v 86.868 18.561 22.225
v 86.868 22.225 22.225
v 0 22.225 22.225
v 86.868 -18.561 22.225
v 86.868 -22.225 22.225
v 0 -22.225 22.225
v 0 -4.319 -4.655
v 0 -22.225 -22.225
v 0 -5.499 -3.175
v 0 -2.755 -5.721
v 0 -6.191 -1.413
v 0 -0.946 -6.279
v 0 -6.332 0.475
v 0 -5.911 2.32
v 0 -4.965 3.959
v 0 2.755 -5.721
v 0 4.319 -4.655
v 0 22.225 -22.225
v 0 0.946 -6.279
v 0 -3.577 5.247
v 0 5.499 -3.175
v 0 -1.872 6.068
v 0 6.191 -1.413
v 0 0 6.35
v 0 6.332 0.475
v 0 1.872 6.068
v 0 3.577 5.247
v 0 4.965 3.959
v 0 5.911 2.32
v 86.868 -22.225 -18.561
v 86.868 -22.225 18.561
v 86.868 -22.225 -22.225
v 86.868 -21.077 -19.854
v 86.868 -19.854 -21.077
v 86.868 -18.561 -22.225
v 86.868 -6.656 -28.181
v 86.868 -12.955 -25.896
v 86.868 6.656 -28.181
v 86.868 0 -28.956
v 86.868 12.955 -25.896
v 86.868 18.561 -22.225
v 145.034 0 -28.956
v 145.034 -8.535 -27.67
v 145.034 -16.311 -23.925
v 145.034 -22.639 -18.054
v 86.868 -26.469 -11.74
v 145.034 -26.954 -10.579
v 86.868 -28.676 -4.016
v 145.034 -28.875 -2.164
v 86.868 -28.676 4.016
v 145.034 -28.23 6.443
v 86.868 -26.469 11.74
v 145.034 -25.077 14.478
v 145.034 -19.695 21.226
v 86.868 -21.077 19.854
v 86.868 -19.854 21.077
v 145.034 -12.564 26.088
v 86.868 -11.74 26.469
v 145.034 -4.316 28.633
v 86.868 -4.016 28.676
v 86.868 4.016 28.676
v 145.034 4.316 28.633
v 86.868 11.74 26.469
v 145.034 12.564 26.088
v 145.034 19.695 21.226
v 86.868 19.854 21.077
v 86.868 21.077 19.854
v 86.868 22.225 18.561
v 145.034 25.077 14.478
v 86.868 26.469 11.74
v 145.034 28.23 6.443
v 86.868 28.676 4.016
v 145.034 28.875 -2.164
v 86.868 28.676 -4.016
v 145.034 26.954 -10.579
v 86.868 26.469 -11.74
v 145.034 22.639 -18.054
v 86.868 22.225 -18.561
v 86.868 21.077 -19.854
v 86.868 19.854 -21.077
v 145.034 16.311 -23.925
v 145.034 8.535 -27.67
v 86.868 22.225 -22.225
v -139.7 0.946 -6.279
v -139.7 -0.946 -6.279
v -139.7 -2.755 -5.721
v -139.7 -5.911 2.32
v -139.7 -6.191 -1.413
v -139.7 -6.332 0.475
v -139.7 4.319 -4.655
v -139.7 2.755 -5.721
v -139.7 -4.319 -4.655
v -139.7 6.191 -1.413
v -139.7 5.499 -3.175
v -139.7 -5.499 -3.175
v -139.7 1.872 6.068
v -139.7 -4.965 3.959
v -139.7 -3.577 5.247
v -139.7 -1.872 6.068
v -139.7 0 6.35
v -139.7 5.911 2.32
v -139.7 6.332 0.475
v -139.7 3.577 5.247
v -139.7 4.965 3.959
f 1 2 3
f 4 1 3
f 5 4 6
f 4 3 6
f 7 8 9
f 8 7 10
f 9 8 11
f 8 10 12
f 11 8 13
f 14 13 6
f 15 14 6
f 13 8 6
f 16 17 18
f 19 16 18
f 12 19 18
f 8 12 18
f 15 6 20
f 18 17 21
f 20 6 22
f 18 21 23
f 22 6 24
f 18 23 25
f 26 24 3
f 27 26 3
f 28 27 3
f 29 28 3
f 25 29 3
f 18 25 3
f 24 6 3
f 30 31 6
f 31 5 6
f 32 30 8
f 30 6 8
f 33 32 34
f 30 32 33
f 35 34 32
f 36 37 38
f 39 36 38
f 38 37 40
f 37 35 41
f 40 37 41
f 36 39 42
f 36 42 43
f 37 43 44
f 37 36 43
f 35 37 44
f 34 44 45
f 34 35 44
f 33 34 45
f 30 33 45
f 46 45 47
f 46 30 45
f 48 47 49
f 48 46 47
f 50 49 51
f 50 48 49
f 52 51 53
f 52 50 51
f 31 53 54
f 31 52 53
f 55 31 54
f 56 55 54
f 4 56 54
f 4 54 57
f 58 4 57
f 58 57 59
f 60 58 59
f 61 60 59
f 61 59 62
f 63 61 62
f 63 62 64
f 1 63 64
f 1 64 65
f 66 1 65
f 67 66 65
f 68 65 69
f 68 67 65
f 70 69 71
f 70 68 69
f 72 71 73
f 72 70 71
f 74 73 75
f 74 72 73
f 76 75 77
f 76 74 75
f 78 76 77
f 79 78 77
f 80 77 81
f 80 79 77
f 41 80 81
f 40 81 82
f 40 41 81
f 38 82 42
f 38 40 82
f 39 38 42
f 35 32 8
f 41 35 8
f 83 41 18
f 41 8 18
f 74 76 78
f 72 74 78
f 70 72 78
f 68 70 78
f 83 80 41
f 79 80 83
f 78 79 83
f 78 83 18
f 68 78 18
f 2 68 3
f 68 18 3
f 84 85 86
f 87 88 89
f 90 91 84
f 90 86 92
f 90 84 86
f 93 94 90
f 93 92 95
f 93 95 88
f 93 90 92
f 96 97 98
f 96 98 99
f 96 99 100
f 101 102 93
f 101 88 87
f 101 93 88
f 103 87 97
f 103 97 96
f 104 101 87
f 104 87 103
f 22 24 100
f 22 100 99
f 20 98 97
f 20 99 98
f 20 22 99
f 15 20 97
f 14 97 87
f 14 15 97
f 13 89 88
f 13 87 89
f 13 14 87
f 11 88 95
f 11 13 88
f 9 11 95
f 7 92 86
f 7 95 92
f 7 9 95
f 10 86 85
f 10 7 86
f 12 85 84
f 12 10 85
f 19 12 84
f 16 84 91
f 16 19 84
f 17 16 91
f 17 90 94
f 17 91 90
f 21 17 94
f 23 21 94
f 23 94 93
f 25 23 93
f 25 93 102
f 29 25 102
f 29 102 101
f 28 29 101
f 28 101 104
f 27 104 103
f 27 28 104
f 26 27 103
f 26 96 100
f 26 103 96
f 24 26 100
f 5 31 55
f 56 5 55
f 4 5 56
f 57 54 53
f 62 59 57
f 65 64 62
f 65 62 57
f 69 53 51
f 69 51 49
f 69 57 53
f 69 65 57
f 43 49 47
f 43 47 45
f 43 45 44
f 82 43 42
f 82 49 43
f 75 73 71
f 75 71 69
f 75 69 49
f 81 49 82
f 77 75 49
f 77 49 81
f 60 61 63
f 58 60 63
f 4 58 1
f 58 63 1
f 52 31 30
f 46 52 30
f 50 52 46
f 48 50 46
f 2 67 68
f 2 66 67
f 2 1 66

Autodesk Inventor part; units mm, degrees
ref_plane "YZ Plane" through (0, 0, 0) normal (1, 0, 0) x (0, 1, 0)
ref_plane "XZ Plane" through (0, 0, 0) normal (0, 1, 0) x (-1, 0, 0)
ref_plane "XY Plane" through (0, 0, 0) normal (0, 0, 1) x (1, 0, 0)
sketch "Sketch1" plane through (0, 0, 0) normal (1, 0, 0) x (0, 1, 0)
  line L0 (22.225, 22.225) -> (-22.225, 22.225)
  line L1 (-22.225, 22.225) -> (-22.225, -22.225)
  line L2 (-22.225, -22.225) -> (22.225, -22.225)
  line L3 (22.225, -22.225) -> (22.225, 22.225)
  line L4 (22.225, 22.225) -> (-22.225, -22.225) construction
  line L5 (-22.225, 22.225) -> (22.225, -22.225) construction
  point P0 (0, 0)
  dimension "d0" = 44.45
  dimension "d1" = 44.45
extrude "Extrusion1" add sketch "Sketch1" along normal blind 86.868
sketch "Sketch2" plane through (86.868, 0, 0) normal (1, 0, 0) x (0, 0, -1)
  circle A0 centre (0, 0) radius 28.956
  dimension "d4" = 57.912
extrude "Extrusion2" add sketch "Sketch2" along normal blind 58.166
sketch "Sketch3" plane through (0, 0, 0) normal (-1, 0, 0) x (0, 0, 1)
  circle A0 centre (0, 0) radius 6.35
  dimension "d7" = 12.7
extrude "Extrusion3" add sketch "Sketch3" along normal blind 139.7
equation "\"d1\" = d0"
properties part number "MotorAxel"
